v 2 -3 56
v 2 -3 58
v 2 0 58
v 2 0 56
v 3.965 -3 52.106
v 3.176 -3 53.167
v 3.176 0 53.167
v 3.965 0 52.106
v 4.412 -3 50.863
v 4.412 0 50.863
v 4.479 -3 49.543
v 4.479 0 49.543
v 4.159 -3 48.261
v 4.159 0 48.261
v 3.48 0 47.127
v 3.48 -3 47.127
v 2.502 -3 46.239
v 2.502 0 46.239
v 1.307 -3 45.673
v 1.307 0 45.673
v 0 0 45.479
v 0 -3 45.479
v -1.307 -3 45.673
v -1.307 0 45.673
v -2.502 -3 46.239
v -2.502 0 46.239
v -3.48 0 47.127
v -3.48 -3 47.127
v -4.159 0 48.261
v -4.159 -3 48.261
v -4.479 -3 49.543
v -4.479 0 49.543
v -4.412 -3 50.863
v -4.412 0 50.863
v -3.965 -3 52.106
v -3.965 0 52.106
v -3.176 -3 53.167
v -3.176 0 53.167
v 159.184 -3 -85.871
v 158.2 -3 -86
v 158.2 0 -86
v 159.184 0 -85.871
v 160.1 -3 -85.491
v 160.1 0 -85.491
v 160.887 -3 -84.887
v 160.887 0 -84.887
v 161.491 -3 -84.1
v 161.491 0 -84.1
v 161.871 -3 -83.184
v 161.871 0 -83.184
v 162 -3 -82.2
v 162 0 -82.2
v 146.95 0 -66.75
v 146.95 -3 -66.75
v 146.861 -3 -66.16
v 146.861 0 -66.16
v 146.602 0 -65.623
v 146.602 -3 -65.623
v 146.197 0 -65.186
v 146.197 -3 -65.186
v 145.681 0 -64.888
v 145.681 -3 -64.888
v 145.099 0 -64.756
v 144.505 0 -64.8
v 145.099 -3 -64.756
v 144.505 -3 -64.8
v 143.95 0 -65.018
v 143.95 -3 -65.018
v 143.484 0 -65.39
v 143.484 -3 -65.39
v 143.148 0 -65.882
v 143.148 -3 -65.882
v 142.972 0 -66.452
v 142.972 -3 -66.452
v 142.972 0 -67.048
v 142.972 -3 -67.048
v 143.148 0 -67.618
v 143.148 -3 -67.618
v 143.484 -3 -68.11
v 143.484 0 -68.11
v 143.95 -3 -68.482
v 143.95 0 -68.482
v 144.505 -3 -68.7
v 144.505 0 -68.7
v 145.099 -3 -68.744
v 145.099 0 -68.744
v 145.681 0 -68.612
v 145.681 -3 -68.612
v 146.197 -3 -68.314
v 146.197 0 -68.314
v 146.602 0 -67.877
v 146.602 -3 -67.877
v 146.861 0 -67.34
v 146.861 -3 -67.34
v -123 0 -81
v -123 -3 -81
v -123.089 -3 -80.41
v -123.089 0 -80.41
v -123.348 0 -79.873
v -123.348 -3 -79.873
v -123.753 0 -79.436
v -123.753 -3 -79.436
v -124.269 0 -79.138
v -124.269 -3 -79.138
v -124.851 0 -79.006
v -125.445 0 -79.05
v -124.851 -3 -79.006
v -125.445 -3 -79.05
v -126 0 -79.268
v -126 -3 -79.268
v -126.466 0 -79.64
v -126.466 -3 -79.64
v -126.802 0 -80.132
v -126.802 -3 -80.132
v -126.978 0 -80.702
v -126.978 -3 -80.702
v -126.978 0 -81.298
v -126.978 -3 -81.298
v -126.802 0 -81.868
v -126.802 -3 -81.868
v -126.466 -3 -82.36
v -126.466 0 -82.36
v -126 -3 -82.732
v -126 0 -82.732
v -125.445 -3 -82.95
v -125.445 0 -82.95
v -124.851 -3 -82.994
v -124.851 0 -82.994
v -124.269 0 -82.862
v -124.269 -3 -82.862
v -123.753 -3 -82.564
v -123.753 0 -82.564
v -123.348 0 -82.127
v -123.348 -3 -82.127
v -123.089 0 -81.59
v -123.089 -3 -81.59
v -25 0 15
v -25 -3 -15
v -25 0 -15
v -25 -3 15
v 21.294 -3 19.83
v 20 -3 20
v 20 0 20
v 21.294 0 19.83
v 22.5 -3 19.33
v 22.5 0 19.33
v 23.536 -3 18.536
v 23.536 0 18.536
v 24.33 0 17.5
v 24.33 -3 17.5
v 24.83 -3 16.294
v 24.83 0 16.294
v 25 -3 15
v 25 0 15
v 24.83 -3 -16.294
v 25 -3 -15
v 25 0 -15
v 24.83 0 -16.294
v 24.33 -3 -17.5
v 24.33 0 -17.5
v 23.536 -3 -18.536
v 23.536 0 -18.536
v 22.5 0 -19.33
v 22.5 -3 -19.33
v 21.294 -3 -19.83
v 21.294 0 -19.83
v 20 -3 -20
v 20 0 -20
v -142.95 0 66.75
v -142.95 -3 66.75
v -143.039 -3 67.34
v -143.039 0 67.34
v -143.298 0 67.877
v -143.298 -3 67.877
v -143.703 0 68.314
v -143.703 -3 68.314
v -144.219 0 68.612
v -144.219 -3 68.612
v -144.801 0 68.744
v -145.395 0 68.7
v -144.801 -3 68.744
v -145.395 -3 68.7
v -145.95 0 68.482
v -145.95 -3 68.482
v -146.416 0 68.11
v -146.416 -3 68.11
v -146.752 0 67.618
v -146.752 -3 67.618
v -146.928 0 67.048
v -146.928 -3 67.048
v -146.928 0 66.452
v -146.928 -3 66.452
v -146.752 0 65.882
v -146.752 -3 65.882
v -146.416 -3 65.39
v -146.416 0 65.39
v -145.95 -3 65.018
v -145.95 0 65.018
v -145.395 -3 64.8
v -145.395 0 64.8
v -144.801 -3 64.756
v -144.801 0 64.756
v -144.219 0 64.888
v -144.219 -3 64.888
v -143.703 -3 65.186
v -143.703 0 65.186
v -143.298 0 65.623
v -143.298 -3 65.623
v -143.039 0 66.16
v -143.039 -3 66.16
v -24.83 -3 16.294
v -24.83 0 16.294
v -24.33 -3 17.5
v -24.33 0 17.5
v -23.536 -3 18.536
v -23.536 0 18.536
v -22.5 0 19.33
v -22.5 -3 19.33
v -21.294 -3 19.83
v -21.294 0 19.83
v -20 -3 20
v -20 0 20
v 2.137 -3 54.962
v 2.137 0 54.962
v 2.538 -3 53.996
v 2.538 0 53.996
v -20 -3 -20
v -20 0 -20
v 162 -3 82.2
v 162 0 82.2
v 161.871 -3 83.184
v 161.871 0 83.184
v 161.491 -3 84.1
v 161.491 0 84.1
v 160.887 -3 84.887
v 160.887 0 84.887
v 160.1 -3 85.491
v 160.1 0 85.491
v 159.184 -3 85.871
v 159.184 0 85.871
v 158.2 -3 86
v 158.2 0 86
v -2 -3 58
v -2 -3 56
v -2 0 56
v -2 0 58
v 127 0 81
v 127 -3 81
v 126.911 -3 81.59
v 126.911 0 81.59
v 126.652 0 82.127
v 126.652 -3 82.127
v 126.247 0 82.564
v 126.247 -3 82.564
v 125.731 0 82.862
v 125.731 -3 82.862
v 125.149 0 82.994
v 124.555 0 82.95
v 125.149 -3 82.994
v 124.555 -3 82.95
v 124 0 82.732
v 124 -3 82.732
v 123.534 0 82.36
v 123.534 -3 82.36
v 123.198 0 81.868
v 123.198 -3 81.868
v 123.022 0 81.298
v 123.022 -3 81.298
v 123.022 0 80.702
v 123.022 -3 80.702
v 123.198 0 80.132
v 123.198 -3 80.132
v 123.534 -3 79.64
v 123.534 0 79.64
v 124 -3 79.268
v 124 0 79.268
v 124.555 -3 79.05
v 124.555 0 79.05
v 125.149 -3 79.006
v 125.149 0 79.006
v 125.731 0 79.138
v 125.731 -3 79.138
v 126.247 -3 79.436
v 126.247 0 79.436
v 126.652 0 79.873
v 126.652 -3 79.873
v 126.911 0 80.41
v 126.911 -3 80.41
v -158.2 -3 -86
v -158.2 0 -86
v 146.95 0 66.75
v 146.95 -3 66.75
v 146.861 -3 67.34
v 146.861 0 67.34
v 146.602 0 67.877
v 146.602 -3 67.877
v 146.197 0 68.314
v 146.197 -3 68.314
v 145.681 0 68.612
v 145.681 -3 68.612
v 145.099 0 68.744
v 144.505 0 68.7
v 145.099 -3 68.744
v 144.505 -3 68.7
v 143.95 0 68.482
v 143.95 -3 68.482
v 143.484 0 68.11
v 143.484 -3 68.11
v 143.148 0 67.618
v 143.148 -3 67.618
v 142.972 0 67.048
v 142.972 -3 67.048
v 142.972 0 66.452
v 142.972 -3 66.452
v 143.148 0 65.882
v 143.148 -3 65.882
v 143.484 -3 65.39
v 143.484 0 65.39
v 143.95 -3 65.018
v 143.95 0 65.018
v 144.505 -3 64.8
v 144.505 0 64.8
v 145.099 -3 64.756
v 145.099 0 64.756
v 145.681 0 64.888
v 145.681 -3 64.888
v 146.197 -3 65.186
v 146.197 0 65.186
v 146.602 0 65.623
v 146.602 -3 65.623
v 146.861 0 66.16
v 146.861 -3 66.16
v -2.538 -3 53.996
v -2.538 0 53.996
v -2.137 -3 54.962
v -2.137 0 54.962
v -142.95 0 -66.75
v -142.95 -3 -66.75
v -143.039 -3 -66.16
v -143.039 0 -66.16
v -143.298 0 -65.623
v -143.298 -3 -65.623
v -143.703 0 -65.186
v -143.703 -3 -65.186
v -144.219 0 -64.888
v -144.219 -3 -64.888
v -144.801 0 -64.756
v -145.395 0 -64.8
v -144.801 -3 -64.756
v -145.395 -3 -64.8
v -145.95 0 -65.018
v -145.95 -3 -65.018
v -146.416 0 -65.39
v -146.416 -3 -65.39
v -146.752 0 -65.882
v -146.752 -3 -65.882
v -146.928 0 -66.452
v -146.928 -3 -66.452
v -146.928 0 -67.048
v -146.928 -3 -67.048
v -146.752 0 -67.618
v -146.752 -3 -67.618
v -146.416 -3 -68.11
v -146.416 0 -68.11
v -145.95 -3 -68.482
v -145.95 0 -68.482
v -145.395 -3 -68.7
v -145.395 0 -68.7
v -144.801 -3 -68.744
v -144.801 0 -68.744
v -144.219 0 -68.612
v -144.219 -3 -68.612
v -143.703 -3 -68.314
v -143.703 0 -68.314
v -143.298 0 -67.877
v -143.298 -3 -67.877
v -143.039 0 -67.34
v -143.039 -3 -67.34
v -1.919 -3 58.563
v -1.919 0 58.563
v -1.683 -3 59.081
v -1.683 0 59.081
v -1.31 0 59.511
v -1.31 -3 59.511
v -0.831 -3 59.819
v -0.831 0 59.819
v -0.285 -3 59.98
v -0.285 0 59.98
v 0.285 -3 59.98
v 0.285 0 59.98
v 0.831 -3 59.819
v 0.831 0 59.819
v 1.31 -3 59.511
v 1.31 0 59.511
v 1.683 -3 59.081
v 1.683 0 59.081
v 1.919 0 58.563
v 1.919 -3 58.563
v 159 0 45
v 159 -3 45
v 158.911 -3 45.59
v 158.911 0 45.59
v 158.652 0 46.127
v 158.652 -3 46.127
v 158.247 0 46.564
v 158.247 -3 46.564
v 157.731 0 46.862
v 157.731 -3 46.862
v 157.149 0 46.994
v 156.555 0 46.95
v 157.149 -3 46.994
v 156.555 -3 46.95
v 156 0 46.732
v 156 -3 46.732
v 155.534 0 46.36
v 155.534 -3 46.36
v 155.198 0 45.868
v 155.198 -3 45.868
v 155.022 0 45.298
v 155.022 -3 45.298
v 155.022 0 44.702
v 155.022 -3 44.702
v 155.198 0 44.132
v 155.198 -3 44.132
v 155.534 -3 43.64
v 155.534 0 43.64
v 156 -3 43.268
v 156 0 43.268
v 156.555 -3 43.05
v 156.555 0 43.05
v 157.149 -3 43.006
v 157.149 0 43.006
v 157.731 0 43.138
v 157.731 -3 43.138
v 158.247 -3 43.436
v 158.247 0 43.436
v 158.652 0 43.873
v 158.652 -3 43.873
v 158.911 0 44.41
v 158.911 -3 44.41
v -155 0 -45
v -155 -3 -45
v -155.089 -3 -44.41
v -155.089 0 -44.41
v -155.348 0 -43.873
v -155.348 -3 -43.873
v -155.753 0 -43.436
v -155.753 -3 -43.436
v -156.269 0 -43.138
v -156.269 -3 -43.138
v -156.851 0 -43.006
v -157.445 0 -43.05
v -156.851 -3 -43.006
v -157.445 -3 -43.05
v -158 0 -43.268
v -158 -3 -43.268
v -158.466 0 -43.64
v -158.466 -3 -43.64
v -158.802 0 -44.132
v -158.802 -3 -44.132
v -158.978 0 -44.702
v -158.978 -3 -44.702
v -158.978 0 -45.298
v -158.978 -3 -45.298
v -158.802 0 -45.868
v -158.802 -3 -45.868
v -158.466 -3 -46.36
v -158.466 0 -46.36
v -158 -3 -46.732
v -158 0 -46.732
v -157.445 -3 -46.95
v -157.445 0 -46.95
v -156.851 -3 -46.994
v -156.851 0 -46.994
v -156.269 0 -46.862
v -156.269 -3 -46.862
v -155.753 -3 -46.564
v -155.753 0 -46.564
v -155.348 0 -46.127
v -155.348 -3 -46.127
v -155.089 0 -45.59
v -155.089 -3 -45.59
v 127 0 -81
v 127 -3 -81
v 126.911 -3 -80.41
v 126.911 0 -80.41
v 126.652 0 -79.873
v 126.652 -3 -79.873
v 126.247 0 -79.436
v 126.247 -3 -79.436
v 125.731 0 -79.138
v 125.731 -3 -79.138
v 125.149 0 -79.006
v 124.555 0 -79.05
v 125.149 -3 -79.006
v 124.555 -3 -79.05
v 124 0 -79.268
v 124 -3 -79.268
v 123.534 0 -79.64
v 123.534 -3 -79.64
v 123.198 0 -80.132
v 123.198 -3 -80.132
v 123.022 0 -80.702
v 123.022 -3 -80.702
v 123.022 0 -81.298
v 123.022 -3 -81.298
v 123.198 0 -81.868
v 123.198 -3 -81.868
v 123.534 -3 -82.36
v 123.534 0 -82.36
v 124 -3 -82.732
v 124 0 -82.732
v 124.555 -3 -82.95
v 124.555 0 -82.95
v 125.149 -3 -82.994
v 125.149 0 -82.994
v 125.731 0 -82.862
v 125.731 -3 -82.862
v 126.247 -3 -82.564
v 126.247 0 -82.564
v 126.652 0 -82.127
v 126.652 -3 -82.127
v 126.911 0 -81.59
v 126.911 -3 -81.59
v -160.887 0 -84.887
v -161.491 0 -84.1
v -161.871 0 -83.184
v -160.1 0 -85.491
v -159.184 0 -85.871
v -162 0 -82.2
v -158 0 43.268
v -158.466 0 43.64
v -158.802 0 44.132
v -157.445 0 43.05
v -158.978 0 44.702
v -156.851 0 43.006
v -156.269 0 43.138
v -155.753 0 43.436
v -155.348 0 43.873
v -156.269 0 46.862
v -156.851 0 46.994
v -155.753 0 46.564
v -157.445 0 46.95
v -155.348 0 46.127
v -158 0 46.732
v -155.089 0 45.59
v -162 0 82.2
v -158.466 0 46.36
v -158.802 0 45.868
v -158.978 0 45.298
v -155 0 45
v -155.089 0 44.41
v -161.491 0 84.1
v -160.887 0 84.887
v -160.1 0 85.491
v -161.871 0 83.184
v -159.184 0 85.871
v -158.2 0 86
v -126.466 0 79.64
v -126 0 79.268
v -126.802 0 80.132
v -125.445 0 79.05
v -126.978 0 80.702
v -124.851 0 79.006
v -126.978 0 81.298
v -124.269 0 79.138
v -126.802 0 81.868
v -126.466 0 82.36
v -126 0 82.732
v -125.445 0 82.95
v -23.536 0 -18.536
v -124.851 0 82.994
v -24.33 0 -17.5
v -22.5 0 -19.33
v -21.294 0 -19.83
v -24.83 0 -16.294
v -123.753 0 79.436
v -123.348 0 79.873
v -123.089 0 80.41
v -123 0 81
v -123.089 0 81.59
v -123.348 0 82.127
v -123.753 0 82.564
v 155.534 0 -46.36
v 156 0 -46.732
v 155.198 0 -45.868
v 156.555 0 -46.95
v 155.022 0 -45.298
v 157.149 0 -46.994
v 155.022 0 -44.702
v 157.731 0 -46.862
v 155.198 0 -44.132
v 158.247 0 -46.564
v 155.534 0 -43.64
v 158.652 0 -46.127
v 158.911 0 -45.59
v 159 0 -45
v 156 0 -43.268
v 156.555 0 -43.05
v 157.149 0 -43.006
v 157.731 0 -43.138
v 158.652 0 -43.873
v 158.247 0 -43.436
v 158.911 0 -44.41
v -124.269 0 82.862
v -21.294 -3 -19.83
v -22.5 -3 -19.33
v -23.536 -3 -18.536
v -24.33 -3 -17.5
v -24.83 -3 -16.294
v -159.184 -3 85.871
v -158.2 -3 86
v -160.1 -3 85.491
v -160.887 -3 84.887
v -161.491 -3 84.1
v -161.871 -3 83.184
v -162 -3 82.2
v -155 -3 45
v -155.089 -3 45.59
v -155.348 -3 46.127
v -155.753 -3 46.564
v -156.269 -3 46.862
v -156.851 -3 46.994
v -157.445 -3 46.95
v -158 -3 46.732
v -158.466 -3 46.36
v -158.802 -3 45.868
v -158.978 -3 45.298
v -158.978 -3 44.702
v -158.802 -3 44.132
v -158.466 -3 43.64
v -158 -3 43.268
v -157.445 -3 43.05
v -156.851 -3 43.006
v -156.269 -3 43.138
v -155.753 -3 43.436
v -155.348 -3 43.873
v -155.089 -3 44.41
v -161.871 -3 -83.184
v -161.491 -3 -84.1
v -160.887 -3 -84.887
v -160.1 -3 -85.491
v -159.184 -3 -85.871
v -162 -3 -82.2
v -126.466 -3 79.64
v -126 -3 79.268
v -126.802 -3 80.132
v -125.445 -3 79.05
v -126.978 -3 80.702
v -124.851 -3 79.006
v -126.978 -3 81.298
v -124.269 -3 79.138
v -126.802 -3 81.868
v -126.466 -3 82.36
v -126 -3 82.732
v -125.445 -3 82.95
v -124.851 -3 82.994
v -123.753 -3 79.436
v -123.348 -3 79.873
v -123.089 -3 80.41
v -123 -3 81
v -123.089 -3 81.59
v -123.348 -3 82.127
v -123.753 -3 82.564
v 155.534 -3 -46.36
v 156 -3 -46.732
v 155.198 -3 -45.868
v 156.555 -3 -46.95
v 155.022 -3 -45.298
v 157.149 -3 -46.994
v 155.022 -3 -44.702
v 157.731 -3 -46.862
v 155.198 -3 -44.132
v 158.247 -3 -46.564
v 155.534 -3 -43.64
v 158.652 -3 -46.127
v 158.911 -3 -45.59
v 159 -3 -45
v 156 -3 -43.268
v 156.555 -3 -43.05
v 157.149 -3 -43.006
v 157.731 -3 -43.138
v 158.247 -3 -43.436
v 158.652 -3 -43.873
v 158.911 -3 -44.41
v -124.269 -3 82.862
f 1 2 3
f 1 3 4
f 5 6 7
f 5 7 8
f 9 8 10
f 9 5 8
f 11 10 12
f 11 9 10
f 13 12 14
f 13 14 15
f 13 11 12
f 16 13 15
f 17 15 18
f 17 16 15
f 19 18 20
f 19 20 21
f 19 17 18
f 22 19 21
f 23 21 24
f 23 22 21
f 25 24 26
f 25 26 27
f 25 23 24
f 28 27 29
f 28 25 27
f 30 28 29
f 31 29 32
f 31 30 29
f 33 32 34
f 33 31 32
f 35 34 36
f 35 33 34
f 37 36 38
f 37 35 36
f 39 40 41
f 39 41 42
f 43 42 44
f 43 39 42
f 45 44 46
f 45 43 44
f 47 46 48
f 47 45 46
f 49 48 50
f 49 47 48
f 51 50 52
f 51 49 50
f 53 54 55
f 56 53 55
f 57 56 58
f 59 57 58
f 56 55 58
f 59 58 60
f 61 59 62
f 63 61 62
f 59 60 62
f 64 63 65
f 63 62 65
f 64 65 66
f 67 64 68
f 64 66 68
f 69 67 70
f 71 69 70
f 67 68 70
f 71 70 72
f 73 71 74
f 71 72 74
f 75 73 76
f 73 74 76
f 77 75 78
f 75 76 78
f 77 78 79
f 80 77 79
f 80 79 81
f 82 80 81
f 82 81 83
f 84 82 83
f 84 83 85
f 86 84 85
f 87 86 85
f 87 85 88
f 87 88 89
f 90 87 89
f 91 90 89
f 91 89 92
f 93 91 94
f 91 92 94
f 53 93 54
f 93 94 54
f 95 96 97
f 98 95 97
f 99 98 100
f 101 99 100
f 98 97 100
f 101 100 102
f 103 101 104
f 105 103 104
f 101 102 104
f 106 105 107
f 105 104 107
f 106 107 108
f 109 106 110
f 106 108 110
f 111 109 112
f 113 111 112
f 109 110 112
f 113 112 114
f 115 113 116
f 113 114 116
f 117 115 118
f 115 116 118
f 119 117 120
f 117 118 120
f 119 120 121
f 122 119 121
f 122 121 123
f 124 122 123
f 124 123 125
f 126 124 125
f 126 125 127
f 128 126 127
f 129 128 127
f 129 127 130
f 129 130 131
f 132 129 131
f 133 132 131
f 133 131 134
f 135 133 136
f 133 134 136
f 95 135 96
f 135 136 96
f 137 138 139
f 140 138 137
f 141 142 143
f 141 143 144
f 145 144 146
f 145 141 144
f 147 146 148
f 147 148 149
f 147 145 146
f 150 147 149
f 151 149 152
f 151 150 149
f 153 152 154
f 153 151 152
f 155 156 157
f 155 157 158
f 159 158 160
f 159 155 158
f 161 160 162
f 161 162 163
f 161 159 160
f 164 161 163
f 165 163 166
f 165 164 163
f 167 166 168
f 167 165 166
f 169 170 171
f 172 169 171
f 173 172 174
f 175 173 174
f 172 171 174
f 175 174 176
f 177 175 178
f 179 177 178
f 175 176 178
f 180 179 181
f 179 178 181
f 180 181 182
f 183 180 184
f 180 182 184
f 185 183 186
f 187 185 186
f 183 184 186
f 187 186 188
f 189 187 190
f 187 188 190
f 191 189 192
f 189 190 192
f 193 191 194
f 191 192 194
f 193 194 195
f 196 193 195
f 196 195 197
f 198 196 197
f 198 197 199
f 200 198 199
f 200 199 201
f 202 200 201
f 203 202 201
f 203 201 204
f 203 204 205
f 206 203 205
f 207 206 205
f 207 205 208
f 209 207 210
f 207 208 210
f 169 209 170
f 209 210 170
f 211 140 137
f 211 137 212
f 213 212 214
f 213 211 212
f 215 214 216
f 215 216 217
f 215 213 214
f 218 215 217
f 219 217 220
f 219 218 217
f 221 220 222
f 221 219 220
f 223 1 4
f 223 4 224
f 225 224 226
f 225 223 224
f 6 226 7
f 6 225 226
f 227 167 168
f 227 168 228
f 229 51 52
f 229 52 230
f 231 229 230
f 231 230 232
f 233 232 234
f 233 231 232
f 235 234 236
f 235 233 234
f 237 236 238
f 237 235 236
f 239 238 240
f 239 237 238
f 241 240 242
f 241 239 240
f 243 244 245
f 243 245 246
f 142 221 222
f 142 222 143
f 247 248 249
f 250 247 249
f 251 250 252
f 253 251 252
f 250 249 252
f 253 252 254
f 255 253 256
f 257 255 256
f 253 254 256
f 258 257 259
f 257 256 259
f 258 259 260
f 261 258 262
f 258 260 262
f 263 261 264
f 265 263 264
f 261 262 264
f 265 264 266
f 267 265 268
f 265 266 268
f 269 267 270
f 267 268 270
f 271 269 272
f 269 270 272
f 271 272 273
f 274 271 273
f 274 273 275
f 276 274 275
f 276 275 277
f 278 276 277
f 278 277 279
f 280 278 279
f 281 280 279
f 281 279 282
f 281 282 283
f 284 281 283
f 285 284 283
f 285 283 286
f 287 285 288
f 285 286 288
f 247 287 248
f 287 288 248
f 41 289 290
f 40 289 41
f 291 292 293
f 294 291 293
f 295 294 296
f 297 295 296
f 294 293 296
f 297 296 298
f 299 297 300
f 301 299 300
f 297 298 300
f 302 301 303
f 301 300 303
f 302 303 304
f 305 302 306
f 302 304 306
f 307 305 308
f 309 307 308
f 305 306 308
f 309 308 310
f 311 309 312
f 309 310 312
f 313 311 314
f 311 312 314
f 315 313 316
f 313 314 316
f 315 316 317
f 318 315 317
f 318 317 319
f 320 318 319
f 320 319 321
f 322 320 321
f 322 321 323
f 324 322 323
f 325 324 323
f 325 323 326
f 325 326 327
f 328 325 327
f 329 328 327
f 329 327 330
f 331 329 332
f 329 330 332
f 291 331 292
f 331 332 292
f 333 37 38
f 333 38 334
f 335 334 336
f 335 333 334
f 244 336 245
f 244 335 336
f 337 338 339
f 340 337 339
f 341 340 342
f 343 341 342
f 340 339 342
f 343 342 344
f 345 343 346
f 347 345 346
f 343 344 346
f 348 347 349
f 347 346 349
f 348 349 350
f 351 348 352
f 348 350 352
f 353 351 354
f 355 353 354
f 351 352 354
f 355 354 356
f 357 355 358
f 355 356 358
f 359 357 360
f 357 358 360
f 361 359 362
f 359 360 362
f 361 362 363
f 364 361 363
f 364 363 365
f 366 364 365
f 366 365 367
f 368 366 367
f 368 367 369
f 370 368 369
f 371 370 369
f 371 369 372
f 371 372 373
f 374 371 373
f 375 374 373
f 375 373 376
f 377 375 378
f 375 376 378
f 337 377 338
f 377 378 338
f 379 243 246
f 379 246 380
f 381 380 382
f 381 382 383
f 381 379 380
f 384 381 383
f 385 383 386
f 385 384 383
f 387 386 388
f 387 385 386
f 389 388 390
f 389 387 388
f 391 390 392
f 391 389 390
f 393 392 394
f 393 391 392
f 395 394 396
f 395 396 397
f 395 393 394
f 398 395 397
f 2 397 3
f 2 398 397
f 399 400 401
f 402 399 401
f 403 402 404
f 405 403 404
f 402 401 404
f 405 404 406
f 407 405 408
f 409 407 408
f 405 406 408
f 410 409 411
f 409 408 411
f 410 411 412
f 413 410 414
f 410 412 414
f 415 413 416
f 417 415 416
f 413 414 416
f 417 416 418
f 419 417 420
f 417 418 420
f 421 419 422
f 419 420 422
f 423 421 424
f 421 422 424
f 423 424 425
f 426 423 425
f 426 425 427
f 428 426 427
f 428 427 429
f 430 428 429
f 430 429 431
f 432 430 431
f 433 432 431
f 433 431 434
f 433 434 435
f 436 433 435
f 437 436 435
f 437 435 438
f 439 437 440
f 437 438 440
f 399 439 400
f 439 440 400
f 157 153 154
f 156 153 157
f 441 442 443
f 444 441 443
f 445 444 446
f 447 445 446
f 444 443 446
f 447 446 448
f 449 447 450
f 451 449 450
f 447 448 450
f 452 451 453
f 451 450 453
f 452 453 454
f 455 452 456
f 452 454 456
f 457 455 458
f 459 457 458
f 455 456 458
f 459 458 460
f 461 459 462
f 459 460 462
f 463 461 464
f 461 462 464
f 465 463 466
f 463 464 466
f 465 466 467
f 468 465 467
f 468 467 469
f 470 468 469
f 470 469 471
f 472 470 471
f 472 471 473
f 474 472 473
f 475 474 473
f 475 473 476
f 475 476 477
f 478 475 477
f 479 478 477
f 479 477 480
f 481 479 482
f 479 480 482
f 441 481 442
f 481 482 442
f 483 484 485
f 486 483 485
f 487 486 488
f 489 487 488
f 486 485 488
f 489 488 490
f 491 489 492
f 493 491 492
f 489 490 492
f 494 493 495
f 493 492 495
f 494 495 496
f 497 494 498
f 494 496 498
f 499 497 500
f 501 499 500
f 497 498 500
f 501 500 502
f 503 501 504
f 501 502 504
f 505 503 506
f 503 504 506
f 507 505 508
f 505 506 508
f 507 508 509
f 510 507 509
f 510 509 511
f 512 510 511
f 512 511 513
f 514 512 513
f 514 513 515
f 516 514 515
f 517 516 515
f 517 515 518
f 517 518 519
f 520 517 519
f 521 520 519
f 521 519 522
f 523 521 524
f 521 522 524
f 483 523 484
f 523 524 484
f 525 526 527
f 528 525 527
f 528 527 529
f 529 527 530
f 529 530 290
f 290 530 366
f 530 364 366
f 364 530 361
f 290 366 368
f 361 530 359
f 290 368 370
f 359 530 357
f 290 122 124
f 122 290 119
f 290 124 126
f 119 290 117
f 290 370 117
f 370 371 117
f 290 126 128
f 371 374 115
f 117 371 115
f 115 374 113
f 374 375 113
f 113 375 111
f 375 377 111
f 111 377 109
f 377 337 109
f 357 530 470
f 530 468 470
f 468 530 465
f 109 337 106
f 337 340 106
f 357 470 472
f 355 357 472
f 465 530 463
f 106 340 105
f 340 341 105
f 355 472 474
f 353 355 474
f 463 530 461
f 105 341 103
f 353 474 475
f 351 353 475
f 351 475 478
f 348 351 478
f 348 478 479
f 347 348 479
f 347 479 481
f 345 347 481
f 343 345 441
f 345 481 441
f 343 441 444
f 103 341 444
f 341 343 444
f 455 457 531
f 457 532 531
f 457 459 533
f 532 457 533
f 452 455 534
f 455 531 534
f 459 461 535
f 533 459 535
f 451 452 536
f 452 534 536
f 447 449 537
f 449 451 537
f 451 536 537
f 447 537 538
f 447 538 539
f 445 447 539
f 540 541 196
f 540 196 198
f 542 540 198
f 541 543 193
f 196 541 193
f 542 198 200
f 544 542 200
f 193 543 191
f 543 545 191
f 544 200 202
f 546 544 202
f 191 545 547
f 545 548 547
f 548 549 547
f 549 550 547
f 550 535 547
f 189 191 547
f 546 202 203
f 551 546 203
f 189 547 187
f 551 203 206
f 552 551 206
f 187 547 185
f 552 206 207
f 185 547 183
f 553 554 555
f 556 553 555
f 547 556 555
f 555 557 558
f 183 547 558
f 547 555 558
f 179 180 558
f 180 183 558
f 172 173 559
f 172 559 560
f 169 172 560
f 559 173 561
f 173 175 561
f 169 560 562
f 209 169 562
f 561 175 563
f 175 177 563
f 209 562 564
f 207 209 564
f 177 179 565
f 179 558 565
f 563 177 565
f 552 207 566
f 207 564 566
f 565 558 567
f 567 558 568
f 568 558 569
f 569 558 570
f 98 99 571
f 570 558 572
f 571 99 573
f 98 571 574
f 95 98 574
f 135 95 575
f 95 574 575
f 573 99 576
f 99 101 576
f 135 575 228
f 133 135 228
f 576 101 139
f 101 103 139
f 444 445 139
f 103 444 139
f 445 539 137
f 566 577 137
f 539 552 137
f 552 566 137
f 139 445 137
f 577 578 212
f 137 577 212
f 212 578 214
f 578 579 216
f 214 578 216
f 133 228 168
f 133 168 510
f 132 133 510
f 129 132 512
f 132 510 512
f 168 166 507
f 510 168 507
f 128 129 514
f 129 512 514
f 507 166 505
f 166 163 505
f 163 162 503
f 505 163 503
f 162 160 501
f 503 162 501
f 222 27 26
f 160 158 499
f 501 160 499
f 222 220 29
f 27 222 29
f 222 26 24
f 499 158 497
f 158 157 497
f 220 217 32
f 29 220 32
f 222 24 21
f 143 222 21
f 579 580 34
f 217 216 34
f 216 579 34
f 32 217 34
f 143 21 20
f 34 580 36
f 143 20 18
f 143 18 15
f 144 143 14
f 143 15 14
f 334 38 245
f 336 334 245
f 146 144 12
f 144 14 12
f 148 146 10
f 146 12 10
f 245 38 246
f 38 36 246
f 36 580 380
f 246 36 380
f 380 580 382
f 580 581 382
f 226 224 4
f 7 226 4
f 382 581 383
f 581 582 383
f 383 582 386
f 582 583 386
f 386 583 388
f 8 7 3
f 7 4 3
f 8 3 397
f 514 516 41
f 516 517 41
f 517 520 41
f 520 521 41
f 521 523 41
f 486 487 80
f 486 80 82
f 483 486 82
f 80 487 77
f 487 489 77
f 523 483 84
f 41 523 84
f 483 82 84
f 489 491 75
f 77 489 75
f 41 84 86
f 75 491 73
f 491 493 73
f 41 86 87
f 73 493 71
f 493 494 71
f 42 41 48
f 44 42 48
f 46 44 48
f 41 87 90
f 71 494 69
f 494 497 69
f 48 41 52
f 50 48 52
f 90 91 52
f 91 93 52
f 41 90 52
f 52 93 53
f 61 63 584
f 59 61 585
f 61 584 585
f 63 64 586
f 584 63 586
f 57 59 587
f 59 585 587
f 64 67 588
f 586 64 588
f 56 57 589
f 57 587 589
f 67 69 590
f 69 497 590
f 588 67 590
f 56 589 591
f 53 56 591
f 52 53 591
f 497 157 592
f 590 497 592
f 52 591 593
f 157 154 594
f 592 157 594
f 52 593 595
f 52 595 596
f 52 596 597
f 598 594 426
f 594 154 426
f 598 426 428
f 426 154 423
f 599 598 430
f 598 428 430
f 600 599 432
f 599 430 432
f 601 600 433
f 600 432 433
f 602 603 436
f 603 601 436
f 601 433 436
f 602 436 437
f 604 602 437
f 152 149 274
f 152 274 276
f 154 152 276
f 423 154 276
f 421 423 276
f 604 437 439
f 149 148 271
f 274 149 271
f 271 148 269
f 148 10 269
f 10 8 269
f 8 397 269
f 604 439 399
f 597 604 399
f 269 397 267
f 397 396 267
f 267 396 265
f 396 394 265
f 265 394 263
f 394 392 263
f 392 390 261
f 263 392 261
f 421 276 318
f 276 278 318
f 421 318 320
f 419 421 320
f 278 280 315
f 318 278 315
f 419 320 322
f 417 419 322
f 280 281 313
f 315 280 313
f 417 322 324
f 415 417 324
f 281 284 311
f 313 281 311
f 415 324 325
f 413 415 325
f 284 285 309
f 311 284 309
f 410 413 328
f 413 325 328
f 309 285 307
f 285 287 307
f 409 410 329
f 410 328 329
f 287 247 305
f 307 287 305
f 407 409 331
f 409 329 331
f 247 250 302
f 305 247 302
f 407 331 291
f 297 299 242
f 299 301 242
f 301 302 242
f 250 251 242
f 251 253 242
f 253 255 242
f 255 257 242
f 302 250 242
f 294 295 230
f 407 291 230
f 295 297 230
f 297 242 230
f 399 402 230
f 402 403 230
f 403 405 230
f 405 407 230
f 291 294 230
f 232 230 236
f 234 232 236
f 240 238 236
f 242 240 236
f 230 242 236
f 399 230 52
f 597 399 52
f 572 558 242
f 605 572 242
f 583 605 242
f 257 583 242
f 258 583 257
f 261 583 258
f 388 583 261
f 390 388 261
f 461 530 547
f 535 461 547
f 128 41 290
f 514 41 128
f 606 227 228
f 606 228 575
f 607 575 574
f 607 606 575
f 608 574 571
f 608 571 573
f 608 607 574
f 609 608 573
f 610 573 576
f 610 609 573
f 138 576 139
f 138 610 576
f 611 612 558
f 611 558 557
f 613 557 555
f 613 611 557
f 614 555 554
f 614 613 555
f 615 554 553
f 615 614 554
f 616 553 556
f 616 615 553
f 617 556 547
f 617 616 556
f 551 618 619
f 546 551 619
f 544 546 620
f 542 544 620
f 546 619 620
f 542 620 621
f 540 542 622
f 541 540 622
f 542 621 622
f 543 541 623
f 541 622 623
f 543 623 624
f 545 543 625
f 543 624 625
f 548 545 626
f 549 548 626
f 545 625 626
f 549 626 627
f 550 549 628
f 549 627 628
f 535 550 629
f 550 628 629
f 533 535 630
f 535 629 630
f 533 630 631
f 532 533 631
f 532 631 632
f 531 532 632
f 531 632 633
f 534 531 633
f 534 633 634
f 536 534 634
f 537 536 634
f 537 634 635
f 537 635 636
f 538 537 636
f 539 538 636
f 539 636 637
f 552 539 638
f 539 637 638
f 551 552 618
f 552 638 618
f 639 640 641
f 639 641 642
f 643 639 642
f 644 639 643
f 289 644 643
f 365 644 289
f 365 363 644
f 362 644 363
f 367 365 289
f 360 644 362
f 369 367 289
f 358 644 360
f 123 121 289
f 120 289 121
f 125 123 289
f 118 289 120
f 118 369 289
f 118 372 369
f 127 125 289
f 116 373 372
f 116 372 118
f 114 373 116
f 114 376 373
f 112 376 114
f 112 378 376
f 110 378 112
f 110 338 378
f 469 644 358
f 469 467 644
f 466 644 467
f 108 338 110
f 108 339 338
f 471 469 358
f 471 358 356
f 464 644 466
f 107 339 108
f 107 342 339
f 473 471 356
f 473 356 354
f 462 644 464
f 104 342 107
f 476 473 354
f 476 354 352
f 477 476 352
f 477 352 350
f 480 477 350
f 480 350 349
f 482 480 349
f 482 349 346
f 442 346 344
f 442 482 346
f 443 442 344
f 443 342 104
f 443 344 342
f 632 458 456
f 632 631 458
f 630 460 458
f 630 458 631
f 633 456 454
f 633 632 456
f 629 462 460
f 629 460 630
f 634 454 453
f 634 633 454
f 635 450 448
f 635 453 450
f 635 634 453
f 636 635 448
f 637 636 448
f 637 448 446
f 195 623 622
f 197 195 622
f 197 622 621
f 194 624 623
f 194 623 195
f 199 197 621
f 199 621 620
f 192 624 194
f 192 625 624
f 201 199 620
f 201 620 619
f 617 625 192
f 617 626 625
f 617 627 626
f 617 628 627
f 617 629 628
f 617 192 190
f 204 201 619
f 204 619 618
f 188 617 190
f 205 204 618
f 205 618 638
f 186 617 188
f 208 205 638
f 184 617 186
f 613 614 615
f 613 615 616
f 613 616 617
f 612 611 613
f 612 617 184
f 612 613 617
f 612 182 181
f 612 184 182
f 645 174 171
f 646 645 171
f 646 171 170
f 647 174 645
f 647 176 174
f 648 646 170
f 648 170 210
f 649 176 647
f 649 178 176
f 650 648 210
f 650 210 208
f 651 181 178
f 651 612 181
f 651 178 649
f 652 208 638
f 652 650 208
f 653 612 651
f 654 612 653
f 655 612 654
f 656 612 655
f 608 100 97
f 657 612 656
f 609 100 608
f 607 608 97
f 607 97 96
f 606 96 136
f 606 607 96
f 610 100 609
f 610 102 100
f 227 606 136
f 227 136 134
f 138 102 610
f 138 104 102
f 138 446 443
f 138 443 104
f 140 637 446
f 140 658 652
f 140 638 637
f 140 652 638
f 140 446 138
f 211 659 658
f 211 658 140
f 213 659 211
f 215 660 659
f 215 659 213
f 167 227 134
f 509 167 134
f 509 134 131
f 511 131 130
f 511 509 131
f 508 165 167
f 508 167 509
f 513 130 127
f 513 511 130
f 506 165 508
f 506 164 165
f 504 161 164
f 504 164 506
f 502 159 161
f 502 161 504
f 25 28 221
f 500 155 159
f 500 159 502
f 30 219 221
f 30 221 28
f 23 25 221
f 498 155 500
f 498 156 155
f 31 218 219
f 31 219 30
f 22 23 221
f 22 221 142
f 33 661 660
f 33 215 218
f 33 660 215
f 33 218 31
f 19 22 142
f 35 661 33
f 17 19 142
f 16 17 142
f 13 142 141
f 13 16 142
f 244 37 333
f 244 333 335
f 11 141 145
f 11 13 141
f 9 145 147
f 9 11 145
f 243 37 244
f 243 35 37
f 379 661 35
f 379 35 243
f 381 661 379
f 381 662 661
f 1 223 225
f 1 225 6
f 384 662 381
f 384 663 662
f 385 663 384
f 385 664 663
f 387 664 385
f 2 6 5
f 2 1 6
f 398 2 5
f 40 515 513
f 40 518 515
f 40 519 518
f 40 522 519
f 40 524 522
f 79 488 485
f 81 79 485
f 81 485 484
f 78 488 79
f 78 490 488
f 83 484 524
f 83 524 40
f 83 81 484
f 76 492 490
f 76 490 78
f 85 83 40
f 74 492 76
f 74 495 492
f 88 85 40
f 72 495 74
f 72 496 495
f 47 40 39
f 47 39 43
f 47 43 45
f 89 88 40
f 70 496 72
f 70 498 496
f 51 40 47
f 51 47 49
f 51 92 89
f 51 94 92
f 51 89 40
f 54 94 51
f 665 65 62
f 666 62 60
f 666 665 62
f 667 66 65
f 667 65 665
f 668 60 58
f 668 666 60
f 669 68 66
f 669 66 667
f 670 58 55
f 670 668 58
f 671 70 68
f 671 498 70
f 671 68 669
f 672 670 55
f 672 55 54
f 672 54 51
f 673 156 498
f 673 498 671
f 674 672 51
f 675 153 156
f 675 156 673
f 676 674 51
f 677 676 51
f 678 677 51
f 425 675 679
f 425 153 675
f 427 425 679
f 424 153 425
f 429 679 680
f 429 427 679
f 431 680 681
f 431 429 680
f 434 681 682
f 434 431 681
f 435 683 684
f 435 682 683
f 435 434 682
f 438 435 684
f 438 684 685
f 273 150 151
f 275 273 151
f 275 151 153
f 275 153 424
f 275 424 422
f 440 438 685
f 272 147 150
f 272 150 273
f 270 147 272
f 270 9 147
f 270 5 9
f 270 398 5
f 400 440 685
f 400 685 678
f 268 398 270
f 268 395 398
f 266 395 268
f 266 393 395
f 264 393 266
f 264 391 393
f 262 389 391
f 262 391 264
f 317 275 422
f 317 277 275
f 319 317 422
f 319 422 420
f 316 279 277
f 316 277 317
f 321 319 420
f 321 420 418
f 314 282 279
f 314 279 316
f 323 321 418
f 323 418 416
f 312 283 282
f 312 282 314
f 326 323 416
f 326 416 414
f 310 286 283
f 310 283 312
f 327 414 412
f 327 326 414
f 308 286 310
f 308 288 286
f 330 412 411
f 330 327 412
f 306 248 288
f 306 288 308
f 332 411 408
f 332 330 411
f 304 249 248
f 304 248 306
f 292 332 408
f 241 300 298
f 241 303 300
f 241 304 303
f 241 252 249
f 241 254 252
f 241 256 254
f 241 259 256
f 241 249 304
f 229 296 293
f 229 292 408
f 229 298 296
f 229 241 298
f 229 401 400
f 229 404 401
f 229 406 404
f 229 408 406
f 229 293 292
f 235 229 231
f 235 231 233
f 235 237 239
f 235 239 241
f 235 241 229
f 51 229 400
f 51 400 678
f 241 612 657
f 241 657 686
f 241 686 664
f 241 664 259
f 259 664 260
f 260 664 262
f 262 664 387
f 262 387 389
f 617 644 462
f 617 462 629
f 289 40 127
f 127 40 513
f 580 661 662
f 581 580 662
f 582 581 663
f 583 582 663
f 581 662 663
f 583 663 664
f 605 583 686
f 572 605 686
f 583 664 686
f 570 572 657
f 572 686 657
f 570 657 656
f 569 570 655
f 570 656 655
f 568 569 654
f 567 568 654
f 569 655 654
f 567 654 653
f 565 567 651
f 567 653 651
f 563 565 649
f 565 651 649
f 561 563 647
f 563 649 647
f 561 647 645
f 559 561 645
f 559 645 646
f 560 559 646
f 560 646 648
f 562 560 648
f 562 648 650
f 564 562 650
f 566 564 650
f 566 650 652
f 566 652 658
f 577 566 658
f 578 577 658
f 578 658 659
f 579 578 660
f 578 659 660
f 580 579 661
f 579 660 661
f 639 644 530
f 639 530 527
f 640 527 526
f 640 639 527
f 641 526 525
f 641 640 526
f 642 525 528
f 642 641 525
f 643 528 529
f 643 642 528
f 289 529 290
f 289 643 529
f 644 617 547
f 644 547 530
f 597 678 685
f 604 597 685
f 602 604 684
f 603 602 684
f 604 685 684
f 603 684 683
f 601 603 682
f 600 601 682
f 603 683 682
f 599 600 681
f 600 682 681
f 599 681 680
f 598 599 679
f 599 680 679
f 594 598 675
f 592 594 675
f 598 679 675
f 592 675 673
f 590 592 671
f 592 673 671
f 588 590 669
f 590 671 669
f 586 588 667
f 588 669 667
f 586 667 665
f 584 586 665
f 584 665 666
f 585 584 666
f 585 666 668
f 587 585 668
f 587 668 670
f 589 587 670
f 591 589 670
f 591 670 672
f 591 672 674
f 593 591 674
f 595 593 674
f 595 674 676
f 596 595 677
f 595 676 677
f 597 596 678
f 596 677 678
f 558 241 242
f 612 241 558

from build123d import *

# Parameters (mm, degrees)
SKETCH_1_R      = 2
EXTRUDE_1_DEPTH = 3


with BuildPart() as part:
    # 草图1 → 凸台-拉伸1 (new body)
    with BuildSketch(Plane.XZ.offset(3)):
        with BuildLine():
            Line((162, -82.2), (162, 82.2))
            ThreePointArc((162, 82.2), (160.887005769, 84.887005769), (158.2, 86))
            Line((158.2, 86), (-158.2, 86))
            ThreePointArc((-158.2, 86), (-160.887005769, 84.887005769), (-162, 82.2))
            Line((-162, 82.2), (-162, -82.2))
            ThreePointArc((-162, -82.2), (-160.887005769, -84.887005769), (-158.2, -86))
            Line((-158.2, -86), (158.2, -86))
            ThreePointArc((158.2, -86), (160.887005769, -84.887005769), (162, -82.2))
        make_face()
        with Locations((-144.95, 66.75)):
            Circle(SKETCH_1_R, mode=Mode.SUBTRACT)
        with Locations((-144.95, -66.75)):
            Circle(SKETCH_1_R, mode=Mode.SUBTRACT)
        with Locations((144.95, -66.75)):
            Circle(SKETCH_1_R, mode=Mode.SUBTRACT)
        with Locations((144.95, 66.75)):
            Circle(SKETCH_1_R, mode=Mode.SUBTRACT)
        with Locations((157, 45)):
            Circle(SKETCH_1_R, mode=Mode.SUBTRACT)
        with Locations((157, -45)):
            Circle(SKETCH_1_R, mode=Mode.SUBTRACT)
        with Locations((125, -81)):
            Circle(SKETCH_1_R, mode=Mode.SUBTRACT)
        with Locations((-125, -81)):
            Circle(SKETCH_1_R, mode=Mode.SUBTRACT)
        with Locations((-157, -45)):
            Circle(SKETCH_1_R, mode=Mode.SUBTRACT)
        with Locations((-157, 45)):
            Circle(SKETCH_1_R, mode=Mode.SUBTRACT)
        with Locations((125, 81)):
            Circle(SKETCH_1_R, mode=Mode.SUBTRACT)
        with Locations((-125, 81)):
            Circle(SKETCH_1_R, mode=Mode.SUBTRACT)
        with BuildLine():
            Line((2, 58), (2, 56))
            ThreePointArc((2, 56), (2.305807419, 54.466070022), (3.176470588, 53.166683629))
            ThreePointArc((3.176470588, 53.166683629), (0, 45.479202711), (-3.176470588, 53.166683629))
            ThreePointArc((-3.176470588, 53.166683629), (-2.305807419, 54.466070022), (-2, 56))
            Line((-2, 56), (-2, 58))
            ThreePointArc((-2, 58), (0, 60), (2, 58))
        make_face(mode=Mode.SUBTRACT)
        with BuildLine():
            Line((25, 15), (25, -15))
            ThreePointArc((25, -15), (23.535533906, -18.535533906), (20, -20))
            Line((20, -20), (-20, -20))
            ThreePointArc((-20, -20), (-23.535533906, -18.535533906), (-25, -15))
            Line((-25, -15), (-25, 15))
            ThreePointArc((-25, 15), (-23.535533906, 18.535533906), (-20, 20))
            Line((-20, 20), (20, 20))
            ThreePointArc((20, 20), (23.535533906, 18.535533906), (25, 15))
        make_face(mode=Mode.SUBTRACT)
    extrude(amount=-EXTRUDE_1_DEPTH)


solid = part.part
